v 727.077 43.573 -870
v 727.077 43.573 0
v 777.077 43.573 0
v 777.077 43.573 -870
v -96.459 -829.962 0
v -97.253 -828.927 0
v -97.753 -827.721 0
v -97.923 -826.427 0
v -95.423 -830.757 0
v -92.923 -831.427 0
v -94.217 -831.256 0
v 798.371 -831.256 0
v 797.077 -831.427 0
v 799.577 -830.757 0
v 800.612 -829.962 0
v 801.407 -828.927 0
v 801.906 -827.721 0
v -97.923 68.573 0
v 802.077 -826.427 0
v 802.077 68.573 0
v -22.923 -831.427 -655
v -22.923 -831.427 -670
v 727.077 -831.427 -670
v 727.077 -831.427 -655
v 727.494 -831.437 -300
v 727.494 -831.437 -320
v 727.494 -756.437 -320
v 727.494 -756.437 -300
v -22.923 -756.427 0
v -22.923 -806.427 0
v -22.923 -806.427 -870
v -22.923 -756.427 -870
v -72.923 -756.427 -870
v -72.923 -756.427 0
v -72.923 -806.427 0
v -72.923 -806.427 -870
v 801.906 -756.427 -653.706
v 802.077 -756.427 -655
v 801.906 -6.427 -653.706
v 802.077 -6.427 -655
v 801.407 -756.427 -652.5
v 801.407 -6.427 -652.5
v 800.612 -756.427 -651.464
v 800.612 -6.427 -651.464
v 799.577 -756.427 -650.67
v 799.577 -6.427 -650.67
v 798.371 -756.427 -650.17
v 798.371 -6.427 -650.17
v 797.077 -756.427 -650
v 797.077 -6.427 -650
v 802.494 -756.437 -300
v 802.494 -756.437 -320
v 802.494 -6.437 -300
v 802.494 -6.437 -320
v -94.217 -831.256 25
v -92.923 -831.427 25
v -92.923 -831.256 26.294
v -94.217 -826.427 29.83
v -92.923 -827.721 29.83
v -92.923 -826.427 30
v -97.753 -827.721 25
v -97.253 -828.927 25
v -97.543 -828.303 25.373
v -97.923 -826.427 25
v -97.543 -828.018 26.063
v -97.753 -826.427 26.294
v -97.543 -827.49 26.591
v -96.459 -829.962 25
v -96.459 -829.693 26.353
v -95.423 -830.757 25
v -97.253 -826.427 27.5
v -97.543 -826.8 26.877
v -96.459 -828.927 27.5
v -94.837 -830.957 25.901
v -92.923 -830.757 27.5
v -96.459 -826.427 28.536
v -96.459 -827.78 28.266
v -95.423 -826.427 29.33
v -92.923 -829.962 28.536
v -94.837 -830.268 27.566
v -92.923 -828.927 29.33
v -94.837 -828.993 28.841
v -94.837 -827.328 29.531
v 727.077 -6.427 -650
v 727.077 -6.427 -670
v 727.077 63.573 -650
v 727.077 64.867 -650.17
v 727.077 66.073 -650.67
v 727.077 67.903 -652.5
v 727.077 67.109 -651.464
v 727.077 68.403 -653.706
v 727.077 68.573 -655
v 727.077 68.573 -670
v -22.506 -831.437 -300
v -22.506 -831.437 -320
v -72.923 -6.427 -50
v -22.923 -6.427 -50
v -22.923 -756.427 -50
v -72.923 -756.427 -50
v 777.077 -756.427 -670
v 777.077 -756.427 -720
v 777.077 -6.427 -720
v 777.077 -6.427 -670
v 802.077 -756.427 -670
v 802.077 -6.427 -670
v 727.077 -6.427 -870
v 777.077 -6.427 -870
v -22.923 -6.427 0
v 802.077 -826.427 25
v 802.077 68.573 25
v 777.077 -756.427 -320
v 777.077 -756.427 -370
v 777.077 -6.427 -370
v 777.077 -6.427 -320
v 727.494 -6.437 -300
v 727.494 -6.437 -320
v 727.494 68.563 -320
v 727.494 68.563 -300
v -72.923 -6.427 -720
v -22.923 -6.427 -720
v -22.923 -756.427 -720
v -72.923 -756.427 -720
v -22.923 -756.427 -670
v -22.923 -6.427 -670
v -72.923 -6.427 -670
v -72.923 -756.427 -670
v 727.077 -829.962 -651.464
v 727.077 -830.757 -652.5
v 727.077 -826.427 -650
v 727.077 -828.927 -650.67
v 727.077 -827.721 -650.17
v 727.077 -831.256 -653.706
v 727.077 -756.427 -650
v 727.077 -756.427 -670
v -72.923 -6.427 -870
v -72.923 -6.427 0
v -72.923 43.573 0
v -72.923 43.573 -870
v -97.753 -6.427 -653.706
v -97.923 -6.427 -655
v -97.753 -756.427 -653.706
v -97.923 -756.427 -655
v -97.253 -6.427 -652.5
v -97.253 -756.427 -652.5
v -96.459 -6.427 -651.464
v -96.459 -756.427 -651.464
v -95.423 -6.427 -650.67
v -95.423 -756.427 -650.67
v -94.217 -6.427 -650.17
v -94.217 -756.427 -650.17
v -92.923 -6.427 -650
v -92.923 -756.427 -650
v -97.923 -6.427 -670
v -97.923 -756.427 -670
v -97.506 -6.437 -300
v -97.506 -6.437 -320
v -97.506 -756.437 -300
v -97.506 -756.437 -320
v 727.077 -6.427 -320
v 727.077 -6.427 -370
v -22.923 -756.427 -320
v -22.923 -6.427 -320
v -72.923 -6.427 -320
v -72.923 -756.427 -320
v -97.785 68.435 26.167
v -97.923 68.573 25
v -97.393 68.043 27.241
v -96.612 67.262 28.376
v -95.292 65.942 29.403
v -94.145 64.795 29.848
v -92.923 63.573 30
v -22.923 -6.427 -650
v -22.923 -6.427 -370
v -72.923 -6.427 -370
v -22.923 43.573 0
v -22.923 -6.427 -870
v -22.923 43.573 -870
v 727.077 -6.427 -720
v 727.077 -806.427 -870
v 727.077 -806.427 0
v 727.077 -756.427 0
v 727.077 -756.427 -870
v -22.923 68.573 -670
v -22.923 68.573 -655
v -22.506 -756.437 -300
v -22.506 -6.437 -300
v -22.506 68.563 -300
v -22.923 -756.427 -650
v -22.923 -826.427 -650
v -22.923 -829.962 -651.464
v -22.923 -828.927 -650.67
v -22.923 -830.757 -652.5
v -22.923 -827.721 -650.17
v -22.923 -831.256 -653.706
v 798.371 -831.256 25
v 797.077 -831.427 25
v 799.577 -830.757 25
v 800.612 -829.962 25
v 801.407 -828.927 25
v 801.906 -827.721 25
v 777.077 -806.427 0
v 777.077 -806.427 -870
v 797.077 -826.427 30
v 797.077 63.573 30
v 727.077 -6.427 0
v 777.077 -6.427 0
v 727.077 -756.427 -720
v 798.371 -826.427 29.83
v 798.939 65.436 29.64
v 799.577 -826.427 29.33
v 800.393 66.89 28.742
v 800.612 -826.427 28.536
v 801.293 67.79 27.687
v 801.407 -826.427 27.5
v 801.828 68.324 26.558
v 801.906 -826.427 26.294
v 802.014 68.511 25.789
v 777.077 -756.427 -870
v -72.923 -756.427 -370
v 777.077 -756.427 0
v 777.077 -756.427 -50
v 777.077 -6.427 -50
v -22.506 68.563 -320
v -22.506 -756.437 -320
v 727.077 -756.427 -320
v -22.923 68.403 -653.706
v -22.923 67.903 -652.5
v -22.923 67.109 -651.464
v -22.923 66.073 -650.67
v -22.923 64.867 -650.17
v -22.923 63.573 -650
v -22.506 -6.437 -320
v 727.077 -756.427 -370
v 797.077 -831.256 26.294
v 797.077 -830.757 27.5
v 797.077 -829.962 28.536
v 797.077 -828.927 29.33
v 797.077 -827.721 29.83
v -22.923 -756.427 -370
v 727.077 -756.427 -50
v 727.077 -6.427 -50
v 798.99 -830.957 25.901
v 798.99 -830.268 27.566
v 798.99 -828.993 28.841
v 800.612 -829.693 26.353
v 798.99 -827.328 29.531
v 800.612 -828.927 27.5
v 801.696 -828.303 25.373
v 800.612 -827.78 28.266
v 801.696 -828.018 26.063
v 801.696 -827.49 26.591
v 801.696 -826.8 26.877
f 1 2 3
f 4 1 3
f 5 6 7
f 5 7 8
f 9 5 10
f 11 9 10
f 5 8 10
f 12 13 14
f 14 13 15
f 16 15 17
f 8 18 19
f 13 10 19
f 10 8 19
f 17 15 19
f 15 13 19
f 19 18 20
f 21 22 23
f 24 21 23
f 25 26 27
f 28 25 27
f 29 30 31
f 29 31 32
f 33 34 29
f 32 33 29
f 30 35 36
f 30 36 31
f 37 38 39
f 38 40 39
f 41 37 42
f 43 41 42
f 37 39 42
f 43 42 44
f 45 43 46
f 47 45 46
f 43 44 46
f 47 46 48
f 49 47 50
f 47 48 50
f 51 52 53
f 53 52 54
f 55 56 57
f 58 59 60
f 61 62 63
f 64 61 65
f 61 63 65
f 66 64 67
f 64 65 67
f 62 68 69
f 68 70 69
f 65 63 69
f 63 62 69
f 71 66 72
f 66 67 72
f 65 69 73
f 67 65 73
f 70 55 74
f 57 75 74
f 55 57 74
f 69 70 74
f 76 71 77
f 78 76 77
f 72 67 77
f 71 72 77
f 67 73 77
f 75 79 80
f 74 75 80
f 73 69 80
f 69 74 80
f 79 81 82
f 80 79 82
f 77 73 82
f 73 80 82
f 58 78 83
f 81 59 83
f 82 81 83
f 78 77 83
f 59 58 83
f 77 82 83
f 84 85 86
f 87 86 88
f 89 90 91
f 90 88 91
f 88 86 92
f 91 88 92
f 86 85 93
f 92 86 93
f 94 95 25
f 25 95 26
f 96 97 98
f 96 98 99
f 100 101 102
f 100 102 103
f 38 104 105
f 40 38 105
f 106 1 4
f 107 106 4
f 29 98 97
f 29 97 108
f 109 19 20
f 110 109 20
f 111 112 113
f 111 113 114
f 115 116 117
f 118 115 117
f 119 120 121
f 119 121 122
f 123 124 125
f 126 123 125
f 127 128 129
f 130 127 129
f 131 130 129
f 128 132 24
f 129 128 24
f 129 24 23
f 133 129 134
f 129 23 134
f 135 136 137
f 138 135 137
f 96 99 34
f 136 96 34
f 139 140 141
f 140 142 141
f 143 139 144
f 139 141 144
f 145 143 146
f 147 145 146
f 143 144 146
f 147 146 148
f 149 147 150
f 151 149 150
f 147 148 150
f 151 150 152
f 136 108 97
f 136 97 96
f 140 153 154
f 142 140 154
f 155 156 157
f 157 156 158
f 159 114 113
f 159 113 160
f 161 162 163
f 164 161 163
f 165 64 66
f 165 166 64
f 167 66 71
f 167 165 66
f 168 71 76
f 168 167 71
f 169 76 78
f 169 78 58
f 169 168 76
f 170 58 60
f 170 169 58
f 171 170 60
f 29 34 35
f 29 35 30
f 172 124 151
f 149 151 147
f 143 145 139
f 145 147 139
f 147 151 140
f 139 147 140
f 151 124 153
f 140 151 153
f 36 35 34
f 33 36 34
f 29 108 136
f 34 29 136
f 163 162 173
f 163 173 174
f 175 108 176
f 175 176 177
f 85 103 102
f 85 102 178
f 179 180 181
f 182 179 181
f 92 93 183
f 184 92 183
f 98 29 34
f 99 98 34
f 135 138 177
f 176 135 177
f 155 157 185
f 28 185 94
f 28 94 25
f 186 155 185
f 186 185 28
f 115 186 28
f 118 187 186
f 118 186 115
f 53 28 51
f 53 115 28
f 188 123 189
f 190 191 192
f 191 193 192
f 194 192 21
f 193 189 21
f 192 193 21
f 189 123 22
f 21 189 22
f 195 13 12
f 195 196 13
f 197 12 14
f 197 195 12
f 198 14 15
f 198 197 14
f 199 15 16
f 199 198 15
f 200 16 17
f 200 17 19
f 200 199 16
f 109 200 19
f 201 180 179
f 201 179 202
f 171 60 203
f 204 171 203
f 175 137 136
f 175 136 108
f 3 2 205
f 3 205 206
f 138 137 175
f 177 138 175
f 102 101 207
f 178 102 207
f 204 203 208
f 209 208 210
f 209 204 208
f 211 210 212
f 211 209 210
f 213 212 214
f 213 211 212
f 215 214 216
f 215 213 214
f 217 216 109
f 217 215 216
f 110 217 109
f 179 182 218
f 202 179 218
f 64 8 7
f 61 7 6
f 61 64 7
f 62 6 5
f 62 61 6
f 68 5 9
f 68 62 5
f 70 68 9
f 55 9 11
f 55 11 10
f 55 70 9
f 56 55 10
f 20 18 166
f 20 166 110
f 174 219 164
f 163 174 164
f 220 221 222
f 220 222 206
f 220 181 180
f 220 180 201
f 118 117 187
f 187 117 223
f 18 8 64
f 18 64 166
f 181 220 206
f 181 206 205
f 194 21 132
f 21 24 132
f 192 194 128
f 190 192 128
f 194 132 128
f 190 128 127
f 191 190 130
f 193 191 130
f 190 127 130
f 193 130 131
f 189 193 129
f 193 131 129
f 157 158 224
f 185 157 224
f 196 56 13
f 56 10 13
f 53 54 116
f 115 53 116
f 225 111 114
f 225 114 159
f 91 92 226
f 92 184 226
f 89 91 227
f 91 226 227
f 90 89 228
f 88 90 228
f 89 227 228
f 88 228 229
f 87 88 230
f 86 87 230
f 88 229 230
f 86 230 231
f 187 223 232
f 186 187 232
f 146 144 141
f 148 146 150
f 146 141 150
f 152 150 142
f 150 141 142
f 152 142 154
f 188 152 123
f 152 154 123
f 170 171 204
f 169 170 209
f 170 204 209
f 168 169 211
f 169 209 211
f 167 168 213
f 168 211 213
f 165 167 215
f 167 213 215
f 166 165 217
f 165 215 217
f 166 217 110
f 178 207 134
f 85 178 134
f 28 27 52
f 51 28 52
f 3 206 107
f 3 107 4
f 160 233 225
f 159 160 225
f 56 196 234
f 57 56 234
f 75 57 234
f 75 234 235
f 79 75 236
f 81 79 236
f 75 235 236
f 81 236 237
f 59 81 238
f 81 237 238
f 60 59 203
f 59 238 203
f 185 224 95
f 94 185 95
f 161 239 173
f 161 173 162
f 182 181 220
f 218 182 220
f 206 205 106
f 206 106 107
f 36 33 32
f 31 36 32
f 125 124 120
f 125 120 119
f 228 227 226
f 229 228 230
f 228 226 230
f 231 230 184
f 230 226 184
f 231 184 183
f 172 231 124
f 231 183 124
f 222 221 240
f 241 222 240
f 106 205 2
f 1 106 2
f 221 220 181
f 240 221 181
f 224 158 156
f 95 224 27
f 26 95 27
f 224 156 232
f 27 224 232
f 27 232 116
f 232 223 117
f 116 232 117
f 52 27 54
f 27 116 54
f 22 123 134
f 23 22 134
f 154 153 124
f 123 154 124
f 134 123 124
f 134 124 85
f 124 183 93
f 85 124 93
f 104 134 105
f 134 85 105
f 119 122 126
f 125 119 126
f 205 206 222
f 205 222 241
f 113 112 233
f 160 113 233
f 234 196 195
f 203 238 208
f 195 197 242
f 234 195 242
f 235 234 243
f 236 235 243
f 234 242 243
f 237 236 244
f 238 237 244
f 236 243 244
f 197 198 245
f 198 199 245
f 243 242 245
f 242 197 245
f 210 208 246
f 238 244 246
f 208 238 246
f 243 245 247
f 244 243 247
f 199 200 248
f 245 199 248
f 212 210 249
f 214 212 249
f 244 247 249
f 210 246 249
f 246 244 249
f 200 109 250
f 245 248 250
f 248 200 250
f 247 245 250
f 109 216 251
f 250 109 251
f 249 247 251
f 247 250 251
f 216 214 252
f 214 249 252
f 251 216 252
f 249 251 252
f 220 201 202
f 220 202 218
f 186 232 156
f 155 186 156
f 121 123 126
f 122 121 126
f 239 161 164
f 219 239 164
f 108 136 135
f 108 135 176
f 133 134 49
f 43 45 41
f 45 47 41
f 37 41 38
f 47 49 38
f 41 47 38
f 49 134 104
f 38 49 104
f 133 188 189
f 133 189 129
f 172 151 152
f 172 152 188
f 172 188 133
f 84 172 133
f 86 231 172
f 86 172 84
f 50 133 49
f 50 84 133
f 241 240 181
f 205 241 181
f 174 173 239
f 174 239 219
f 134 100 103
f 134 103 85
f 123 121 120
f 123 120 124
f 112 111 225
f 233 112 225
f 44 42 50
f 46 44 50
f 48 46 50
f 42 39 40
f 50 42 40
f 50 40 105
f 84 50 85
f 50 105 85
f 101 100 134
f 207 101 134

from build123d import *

# Parameters (mm, degrees)
F0_W      = 50
F0_H      = 50
F1_DEPTH  = 870
F4_W      = 900
F4_H      = 900
F5_DEPTH  = 30
F8_DEPTH  = 20
F9_R      = 5
F10_R     = 5
F11_R     = 5
F3_W      = 50
F3_H      = 50
F12_DEPTH = 750
F14_DEPTH = 20


with BuildPart() as f1:
    # F0 (on Top) → F1 (new body)
    with BuildSketch(Plane.XY):
        with Locations((-47.9233672377, -781.426829705)):
            Rectangle(F0_W, F0_H)
    extrude(amount=-F1_DEPTH)


with BuildPart() as f1b:
    # F0 (on Top) → F1, piece 2 (new body)
    with BuildSketch(Plane.XY):
        with Locations((-47.9233672377, 18.573170295)):
            Rectangle(F0_W, F0_H)
    extrude(amount=-F1_DEPTH)


with BuildPart() as f1c:
    # F0 (on Top) → F1, piece 3 (new body)
    with BuildSketch(Plane.XY):
        with Locations((752.0766327623, -781.426829705)):
            Rectangle(F0_W, F0_H)
    extrude(amount=-F1_DEPTH)


with BuildPart() as f1d:
    # F0 (on Top) → F1, piece 4 (new body)
    with BuildSketch(Plane.XY):
        with Locations((752.0766327623, 18.573170295)):
            Rectangle(F0_W, F0_H)
    extrude(amount=-F1_DEPTH)


with BuildPart() as f5:
    # F4 (on face) → F5 (new body)
    with BuildSketch(Plane.XY):
        with Locations((352.0766327623, -381.426829705)):
            Rectangle(F4_W, F4_H)
    extrude(amount=F5_DEPTH)

    # F9
    f9_edges = [f5.edges().sort_by_distance(p)[0] for p in [
        (352.076633, -831.42683, 30),
    ]]
    fillet(f9_edges, radius=F9_R)

    # F10
    f10_edges = [f5.edges().sort_by_distance(p)[0] for p in [
        (802.076633, -378.92683, 30),
        (-97.923367, -378.92683, 30),
        (352.076633, 68.57317, 30),
    ]]
    fillet(f10_edges, radius=F10_R)


with BuildPart() as f8:
    # F7 (on face) → F8 (new body)
    with BuildSketch(Plane.XY.offset(-670)):
        Polygon((727.0766327623, -756.426829705), (802.0766327623, -756.426829705), (802.0766327623, -6.426829705), (727.0766327623, -6.426829705), (727.0766327623, 68.573170295), (-22.9233672377, 68.573170295), (-22.9233672377, -6.426829705), (-97.9233672377, -6.426829705), (-97.9233672377, -756.426829705), (-22.9233672377, -756.426829705), (-22.9233672377, -831.426829705), (727.0766327623, -831.426829705), align=None)
    extrude(amount=F8_DEPTH)

    # F11
    f11_edges = [f8.edges().sort_by_distance(p)[0] for p in [
        (802.076633, -381.42683, -650),
        (352.076633, 68.57317, -650),
        (352.076633, -831.42683, -650),
        (-97.923367, -381.42683, -650),
    ]]
    fillet(f11_edges, radius=F11_R)


with BuildPart() as f12:
    # F3 (on face) → F12 (new body)
    with BuildSketch(Plane(origin=(0, -756.426829705, 0), x_dir=(-1, 0, 0), z_dir=(0, 1, 0))):
        with Locations((-752.0766327623, -695)):
            Rectangle(F3_W, F3_H)
    extrude(amount=F12_DEPTH)


with BuildPart() as f12b:
    # F3 (on face) → F12, piece 2 (new body)
    with BuildSketch(Plane(origin=(0, -756.426829705, 0), x_dir=(-1, 0, 0), z_dir=(0, 1, 0))):
        with Locations((47.9233672377, -695)):
            Rectangle(F3_W, F3_H)
    extrude(amount=F12_DEPTH)


with BuildPart() as f12c:
    # F3 (on face) → F12, piece 3 (new body)
    with BuildSketch(Plane(origin=(0, -756.426829705, 0), x_dir=(-1, 0, 0), z_dir=(0, 1, 0))):
        with Locations((47.9233672377, -25)):
            Rectangle(F3_W, F3_H)
    extrude(amount=F12_DEPTH)


with BuildPart() as f12d:
    # F3 (on face) → F12, piece 4 (new body)
    with BuildSketch(Plane(origin=(0, -756.426829705, 0), x_dir=(-1, 0, 0), z_dir=(0, 1, 0))):
        with Locations((-752.0766327623, -25)):
            Rectangle(F3_W, F3_H)
    extrude(amount=F12_DEPTH)


with BuildPart() as f12e:
    # F3 (on face) → F12, piece 5 (new body)
    with BuildSketch(Plane(origin=(0, -756.426829705, 0), x_dir=(-1, 0, 0), z_dir=(0, 1, 0))):
        with Locations((47.9233672377, -345)):
            Rectangle(F3_W, F3_H)
    extrude(amount=F12_DEPTH)


with BuildPart() as f12f:
    # F3 (on face) → F12, piece 6 (new body)
    with BuildSketch(Plane(origin=(0, -756.426829705, 0), x_dir=(-1, 0, 0), z_dir=(0, 1, 0))):
        with Locations((-752.0766327623, -345)):
            Rectangle(F3_W, F3_H)
    extrude(amount=F12_DEPTH)


with BuildPart() as f14:
    # F13 (on face) → F14 (new body)
    with BuildSketch(Plane.XY.offset(-320)):
        Polygon((727.49376297, -756.4368884079), (802.49376297, -756.4368884079), (802.49376297, -6.4368884079), (727.49376297, -6.4368884079), (727.49376297, 68.5631115921), (-22.50623703, 68.5631115921), (-22.50623703, -6.4368884079), (-97.50623703, -6.4368884079), (-97.50623703, -756.4368884079), (-22.50623703, -756.4368884079), (-22.50623703, -831.4368884079), (727.49376297, -831.4368884079), align=None)
    extrude(amount=F14_DEPTH)


solid = Compound([f1.part, f1b.part, f1c.part, f1d.part, f5.part, f8.part, f12.part, f12b.part, f12c.part, f12d.part, f12e.part, f12f.part, f14.part])
